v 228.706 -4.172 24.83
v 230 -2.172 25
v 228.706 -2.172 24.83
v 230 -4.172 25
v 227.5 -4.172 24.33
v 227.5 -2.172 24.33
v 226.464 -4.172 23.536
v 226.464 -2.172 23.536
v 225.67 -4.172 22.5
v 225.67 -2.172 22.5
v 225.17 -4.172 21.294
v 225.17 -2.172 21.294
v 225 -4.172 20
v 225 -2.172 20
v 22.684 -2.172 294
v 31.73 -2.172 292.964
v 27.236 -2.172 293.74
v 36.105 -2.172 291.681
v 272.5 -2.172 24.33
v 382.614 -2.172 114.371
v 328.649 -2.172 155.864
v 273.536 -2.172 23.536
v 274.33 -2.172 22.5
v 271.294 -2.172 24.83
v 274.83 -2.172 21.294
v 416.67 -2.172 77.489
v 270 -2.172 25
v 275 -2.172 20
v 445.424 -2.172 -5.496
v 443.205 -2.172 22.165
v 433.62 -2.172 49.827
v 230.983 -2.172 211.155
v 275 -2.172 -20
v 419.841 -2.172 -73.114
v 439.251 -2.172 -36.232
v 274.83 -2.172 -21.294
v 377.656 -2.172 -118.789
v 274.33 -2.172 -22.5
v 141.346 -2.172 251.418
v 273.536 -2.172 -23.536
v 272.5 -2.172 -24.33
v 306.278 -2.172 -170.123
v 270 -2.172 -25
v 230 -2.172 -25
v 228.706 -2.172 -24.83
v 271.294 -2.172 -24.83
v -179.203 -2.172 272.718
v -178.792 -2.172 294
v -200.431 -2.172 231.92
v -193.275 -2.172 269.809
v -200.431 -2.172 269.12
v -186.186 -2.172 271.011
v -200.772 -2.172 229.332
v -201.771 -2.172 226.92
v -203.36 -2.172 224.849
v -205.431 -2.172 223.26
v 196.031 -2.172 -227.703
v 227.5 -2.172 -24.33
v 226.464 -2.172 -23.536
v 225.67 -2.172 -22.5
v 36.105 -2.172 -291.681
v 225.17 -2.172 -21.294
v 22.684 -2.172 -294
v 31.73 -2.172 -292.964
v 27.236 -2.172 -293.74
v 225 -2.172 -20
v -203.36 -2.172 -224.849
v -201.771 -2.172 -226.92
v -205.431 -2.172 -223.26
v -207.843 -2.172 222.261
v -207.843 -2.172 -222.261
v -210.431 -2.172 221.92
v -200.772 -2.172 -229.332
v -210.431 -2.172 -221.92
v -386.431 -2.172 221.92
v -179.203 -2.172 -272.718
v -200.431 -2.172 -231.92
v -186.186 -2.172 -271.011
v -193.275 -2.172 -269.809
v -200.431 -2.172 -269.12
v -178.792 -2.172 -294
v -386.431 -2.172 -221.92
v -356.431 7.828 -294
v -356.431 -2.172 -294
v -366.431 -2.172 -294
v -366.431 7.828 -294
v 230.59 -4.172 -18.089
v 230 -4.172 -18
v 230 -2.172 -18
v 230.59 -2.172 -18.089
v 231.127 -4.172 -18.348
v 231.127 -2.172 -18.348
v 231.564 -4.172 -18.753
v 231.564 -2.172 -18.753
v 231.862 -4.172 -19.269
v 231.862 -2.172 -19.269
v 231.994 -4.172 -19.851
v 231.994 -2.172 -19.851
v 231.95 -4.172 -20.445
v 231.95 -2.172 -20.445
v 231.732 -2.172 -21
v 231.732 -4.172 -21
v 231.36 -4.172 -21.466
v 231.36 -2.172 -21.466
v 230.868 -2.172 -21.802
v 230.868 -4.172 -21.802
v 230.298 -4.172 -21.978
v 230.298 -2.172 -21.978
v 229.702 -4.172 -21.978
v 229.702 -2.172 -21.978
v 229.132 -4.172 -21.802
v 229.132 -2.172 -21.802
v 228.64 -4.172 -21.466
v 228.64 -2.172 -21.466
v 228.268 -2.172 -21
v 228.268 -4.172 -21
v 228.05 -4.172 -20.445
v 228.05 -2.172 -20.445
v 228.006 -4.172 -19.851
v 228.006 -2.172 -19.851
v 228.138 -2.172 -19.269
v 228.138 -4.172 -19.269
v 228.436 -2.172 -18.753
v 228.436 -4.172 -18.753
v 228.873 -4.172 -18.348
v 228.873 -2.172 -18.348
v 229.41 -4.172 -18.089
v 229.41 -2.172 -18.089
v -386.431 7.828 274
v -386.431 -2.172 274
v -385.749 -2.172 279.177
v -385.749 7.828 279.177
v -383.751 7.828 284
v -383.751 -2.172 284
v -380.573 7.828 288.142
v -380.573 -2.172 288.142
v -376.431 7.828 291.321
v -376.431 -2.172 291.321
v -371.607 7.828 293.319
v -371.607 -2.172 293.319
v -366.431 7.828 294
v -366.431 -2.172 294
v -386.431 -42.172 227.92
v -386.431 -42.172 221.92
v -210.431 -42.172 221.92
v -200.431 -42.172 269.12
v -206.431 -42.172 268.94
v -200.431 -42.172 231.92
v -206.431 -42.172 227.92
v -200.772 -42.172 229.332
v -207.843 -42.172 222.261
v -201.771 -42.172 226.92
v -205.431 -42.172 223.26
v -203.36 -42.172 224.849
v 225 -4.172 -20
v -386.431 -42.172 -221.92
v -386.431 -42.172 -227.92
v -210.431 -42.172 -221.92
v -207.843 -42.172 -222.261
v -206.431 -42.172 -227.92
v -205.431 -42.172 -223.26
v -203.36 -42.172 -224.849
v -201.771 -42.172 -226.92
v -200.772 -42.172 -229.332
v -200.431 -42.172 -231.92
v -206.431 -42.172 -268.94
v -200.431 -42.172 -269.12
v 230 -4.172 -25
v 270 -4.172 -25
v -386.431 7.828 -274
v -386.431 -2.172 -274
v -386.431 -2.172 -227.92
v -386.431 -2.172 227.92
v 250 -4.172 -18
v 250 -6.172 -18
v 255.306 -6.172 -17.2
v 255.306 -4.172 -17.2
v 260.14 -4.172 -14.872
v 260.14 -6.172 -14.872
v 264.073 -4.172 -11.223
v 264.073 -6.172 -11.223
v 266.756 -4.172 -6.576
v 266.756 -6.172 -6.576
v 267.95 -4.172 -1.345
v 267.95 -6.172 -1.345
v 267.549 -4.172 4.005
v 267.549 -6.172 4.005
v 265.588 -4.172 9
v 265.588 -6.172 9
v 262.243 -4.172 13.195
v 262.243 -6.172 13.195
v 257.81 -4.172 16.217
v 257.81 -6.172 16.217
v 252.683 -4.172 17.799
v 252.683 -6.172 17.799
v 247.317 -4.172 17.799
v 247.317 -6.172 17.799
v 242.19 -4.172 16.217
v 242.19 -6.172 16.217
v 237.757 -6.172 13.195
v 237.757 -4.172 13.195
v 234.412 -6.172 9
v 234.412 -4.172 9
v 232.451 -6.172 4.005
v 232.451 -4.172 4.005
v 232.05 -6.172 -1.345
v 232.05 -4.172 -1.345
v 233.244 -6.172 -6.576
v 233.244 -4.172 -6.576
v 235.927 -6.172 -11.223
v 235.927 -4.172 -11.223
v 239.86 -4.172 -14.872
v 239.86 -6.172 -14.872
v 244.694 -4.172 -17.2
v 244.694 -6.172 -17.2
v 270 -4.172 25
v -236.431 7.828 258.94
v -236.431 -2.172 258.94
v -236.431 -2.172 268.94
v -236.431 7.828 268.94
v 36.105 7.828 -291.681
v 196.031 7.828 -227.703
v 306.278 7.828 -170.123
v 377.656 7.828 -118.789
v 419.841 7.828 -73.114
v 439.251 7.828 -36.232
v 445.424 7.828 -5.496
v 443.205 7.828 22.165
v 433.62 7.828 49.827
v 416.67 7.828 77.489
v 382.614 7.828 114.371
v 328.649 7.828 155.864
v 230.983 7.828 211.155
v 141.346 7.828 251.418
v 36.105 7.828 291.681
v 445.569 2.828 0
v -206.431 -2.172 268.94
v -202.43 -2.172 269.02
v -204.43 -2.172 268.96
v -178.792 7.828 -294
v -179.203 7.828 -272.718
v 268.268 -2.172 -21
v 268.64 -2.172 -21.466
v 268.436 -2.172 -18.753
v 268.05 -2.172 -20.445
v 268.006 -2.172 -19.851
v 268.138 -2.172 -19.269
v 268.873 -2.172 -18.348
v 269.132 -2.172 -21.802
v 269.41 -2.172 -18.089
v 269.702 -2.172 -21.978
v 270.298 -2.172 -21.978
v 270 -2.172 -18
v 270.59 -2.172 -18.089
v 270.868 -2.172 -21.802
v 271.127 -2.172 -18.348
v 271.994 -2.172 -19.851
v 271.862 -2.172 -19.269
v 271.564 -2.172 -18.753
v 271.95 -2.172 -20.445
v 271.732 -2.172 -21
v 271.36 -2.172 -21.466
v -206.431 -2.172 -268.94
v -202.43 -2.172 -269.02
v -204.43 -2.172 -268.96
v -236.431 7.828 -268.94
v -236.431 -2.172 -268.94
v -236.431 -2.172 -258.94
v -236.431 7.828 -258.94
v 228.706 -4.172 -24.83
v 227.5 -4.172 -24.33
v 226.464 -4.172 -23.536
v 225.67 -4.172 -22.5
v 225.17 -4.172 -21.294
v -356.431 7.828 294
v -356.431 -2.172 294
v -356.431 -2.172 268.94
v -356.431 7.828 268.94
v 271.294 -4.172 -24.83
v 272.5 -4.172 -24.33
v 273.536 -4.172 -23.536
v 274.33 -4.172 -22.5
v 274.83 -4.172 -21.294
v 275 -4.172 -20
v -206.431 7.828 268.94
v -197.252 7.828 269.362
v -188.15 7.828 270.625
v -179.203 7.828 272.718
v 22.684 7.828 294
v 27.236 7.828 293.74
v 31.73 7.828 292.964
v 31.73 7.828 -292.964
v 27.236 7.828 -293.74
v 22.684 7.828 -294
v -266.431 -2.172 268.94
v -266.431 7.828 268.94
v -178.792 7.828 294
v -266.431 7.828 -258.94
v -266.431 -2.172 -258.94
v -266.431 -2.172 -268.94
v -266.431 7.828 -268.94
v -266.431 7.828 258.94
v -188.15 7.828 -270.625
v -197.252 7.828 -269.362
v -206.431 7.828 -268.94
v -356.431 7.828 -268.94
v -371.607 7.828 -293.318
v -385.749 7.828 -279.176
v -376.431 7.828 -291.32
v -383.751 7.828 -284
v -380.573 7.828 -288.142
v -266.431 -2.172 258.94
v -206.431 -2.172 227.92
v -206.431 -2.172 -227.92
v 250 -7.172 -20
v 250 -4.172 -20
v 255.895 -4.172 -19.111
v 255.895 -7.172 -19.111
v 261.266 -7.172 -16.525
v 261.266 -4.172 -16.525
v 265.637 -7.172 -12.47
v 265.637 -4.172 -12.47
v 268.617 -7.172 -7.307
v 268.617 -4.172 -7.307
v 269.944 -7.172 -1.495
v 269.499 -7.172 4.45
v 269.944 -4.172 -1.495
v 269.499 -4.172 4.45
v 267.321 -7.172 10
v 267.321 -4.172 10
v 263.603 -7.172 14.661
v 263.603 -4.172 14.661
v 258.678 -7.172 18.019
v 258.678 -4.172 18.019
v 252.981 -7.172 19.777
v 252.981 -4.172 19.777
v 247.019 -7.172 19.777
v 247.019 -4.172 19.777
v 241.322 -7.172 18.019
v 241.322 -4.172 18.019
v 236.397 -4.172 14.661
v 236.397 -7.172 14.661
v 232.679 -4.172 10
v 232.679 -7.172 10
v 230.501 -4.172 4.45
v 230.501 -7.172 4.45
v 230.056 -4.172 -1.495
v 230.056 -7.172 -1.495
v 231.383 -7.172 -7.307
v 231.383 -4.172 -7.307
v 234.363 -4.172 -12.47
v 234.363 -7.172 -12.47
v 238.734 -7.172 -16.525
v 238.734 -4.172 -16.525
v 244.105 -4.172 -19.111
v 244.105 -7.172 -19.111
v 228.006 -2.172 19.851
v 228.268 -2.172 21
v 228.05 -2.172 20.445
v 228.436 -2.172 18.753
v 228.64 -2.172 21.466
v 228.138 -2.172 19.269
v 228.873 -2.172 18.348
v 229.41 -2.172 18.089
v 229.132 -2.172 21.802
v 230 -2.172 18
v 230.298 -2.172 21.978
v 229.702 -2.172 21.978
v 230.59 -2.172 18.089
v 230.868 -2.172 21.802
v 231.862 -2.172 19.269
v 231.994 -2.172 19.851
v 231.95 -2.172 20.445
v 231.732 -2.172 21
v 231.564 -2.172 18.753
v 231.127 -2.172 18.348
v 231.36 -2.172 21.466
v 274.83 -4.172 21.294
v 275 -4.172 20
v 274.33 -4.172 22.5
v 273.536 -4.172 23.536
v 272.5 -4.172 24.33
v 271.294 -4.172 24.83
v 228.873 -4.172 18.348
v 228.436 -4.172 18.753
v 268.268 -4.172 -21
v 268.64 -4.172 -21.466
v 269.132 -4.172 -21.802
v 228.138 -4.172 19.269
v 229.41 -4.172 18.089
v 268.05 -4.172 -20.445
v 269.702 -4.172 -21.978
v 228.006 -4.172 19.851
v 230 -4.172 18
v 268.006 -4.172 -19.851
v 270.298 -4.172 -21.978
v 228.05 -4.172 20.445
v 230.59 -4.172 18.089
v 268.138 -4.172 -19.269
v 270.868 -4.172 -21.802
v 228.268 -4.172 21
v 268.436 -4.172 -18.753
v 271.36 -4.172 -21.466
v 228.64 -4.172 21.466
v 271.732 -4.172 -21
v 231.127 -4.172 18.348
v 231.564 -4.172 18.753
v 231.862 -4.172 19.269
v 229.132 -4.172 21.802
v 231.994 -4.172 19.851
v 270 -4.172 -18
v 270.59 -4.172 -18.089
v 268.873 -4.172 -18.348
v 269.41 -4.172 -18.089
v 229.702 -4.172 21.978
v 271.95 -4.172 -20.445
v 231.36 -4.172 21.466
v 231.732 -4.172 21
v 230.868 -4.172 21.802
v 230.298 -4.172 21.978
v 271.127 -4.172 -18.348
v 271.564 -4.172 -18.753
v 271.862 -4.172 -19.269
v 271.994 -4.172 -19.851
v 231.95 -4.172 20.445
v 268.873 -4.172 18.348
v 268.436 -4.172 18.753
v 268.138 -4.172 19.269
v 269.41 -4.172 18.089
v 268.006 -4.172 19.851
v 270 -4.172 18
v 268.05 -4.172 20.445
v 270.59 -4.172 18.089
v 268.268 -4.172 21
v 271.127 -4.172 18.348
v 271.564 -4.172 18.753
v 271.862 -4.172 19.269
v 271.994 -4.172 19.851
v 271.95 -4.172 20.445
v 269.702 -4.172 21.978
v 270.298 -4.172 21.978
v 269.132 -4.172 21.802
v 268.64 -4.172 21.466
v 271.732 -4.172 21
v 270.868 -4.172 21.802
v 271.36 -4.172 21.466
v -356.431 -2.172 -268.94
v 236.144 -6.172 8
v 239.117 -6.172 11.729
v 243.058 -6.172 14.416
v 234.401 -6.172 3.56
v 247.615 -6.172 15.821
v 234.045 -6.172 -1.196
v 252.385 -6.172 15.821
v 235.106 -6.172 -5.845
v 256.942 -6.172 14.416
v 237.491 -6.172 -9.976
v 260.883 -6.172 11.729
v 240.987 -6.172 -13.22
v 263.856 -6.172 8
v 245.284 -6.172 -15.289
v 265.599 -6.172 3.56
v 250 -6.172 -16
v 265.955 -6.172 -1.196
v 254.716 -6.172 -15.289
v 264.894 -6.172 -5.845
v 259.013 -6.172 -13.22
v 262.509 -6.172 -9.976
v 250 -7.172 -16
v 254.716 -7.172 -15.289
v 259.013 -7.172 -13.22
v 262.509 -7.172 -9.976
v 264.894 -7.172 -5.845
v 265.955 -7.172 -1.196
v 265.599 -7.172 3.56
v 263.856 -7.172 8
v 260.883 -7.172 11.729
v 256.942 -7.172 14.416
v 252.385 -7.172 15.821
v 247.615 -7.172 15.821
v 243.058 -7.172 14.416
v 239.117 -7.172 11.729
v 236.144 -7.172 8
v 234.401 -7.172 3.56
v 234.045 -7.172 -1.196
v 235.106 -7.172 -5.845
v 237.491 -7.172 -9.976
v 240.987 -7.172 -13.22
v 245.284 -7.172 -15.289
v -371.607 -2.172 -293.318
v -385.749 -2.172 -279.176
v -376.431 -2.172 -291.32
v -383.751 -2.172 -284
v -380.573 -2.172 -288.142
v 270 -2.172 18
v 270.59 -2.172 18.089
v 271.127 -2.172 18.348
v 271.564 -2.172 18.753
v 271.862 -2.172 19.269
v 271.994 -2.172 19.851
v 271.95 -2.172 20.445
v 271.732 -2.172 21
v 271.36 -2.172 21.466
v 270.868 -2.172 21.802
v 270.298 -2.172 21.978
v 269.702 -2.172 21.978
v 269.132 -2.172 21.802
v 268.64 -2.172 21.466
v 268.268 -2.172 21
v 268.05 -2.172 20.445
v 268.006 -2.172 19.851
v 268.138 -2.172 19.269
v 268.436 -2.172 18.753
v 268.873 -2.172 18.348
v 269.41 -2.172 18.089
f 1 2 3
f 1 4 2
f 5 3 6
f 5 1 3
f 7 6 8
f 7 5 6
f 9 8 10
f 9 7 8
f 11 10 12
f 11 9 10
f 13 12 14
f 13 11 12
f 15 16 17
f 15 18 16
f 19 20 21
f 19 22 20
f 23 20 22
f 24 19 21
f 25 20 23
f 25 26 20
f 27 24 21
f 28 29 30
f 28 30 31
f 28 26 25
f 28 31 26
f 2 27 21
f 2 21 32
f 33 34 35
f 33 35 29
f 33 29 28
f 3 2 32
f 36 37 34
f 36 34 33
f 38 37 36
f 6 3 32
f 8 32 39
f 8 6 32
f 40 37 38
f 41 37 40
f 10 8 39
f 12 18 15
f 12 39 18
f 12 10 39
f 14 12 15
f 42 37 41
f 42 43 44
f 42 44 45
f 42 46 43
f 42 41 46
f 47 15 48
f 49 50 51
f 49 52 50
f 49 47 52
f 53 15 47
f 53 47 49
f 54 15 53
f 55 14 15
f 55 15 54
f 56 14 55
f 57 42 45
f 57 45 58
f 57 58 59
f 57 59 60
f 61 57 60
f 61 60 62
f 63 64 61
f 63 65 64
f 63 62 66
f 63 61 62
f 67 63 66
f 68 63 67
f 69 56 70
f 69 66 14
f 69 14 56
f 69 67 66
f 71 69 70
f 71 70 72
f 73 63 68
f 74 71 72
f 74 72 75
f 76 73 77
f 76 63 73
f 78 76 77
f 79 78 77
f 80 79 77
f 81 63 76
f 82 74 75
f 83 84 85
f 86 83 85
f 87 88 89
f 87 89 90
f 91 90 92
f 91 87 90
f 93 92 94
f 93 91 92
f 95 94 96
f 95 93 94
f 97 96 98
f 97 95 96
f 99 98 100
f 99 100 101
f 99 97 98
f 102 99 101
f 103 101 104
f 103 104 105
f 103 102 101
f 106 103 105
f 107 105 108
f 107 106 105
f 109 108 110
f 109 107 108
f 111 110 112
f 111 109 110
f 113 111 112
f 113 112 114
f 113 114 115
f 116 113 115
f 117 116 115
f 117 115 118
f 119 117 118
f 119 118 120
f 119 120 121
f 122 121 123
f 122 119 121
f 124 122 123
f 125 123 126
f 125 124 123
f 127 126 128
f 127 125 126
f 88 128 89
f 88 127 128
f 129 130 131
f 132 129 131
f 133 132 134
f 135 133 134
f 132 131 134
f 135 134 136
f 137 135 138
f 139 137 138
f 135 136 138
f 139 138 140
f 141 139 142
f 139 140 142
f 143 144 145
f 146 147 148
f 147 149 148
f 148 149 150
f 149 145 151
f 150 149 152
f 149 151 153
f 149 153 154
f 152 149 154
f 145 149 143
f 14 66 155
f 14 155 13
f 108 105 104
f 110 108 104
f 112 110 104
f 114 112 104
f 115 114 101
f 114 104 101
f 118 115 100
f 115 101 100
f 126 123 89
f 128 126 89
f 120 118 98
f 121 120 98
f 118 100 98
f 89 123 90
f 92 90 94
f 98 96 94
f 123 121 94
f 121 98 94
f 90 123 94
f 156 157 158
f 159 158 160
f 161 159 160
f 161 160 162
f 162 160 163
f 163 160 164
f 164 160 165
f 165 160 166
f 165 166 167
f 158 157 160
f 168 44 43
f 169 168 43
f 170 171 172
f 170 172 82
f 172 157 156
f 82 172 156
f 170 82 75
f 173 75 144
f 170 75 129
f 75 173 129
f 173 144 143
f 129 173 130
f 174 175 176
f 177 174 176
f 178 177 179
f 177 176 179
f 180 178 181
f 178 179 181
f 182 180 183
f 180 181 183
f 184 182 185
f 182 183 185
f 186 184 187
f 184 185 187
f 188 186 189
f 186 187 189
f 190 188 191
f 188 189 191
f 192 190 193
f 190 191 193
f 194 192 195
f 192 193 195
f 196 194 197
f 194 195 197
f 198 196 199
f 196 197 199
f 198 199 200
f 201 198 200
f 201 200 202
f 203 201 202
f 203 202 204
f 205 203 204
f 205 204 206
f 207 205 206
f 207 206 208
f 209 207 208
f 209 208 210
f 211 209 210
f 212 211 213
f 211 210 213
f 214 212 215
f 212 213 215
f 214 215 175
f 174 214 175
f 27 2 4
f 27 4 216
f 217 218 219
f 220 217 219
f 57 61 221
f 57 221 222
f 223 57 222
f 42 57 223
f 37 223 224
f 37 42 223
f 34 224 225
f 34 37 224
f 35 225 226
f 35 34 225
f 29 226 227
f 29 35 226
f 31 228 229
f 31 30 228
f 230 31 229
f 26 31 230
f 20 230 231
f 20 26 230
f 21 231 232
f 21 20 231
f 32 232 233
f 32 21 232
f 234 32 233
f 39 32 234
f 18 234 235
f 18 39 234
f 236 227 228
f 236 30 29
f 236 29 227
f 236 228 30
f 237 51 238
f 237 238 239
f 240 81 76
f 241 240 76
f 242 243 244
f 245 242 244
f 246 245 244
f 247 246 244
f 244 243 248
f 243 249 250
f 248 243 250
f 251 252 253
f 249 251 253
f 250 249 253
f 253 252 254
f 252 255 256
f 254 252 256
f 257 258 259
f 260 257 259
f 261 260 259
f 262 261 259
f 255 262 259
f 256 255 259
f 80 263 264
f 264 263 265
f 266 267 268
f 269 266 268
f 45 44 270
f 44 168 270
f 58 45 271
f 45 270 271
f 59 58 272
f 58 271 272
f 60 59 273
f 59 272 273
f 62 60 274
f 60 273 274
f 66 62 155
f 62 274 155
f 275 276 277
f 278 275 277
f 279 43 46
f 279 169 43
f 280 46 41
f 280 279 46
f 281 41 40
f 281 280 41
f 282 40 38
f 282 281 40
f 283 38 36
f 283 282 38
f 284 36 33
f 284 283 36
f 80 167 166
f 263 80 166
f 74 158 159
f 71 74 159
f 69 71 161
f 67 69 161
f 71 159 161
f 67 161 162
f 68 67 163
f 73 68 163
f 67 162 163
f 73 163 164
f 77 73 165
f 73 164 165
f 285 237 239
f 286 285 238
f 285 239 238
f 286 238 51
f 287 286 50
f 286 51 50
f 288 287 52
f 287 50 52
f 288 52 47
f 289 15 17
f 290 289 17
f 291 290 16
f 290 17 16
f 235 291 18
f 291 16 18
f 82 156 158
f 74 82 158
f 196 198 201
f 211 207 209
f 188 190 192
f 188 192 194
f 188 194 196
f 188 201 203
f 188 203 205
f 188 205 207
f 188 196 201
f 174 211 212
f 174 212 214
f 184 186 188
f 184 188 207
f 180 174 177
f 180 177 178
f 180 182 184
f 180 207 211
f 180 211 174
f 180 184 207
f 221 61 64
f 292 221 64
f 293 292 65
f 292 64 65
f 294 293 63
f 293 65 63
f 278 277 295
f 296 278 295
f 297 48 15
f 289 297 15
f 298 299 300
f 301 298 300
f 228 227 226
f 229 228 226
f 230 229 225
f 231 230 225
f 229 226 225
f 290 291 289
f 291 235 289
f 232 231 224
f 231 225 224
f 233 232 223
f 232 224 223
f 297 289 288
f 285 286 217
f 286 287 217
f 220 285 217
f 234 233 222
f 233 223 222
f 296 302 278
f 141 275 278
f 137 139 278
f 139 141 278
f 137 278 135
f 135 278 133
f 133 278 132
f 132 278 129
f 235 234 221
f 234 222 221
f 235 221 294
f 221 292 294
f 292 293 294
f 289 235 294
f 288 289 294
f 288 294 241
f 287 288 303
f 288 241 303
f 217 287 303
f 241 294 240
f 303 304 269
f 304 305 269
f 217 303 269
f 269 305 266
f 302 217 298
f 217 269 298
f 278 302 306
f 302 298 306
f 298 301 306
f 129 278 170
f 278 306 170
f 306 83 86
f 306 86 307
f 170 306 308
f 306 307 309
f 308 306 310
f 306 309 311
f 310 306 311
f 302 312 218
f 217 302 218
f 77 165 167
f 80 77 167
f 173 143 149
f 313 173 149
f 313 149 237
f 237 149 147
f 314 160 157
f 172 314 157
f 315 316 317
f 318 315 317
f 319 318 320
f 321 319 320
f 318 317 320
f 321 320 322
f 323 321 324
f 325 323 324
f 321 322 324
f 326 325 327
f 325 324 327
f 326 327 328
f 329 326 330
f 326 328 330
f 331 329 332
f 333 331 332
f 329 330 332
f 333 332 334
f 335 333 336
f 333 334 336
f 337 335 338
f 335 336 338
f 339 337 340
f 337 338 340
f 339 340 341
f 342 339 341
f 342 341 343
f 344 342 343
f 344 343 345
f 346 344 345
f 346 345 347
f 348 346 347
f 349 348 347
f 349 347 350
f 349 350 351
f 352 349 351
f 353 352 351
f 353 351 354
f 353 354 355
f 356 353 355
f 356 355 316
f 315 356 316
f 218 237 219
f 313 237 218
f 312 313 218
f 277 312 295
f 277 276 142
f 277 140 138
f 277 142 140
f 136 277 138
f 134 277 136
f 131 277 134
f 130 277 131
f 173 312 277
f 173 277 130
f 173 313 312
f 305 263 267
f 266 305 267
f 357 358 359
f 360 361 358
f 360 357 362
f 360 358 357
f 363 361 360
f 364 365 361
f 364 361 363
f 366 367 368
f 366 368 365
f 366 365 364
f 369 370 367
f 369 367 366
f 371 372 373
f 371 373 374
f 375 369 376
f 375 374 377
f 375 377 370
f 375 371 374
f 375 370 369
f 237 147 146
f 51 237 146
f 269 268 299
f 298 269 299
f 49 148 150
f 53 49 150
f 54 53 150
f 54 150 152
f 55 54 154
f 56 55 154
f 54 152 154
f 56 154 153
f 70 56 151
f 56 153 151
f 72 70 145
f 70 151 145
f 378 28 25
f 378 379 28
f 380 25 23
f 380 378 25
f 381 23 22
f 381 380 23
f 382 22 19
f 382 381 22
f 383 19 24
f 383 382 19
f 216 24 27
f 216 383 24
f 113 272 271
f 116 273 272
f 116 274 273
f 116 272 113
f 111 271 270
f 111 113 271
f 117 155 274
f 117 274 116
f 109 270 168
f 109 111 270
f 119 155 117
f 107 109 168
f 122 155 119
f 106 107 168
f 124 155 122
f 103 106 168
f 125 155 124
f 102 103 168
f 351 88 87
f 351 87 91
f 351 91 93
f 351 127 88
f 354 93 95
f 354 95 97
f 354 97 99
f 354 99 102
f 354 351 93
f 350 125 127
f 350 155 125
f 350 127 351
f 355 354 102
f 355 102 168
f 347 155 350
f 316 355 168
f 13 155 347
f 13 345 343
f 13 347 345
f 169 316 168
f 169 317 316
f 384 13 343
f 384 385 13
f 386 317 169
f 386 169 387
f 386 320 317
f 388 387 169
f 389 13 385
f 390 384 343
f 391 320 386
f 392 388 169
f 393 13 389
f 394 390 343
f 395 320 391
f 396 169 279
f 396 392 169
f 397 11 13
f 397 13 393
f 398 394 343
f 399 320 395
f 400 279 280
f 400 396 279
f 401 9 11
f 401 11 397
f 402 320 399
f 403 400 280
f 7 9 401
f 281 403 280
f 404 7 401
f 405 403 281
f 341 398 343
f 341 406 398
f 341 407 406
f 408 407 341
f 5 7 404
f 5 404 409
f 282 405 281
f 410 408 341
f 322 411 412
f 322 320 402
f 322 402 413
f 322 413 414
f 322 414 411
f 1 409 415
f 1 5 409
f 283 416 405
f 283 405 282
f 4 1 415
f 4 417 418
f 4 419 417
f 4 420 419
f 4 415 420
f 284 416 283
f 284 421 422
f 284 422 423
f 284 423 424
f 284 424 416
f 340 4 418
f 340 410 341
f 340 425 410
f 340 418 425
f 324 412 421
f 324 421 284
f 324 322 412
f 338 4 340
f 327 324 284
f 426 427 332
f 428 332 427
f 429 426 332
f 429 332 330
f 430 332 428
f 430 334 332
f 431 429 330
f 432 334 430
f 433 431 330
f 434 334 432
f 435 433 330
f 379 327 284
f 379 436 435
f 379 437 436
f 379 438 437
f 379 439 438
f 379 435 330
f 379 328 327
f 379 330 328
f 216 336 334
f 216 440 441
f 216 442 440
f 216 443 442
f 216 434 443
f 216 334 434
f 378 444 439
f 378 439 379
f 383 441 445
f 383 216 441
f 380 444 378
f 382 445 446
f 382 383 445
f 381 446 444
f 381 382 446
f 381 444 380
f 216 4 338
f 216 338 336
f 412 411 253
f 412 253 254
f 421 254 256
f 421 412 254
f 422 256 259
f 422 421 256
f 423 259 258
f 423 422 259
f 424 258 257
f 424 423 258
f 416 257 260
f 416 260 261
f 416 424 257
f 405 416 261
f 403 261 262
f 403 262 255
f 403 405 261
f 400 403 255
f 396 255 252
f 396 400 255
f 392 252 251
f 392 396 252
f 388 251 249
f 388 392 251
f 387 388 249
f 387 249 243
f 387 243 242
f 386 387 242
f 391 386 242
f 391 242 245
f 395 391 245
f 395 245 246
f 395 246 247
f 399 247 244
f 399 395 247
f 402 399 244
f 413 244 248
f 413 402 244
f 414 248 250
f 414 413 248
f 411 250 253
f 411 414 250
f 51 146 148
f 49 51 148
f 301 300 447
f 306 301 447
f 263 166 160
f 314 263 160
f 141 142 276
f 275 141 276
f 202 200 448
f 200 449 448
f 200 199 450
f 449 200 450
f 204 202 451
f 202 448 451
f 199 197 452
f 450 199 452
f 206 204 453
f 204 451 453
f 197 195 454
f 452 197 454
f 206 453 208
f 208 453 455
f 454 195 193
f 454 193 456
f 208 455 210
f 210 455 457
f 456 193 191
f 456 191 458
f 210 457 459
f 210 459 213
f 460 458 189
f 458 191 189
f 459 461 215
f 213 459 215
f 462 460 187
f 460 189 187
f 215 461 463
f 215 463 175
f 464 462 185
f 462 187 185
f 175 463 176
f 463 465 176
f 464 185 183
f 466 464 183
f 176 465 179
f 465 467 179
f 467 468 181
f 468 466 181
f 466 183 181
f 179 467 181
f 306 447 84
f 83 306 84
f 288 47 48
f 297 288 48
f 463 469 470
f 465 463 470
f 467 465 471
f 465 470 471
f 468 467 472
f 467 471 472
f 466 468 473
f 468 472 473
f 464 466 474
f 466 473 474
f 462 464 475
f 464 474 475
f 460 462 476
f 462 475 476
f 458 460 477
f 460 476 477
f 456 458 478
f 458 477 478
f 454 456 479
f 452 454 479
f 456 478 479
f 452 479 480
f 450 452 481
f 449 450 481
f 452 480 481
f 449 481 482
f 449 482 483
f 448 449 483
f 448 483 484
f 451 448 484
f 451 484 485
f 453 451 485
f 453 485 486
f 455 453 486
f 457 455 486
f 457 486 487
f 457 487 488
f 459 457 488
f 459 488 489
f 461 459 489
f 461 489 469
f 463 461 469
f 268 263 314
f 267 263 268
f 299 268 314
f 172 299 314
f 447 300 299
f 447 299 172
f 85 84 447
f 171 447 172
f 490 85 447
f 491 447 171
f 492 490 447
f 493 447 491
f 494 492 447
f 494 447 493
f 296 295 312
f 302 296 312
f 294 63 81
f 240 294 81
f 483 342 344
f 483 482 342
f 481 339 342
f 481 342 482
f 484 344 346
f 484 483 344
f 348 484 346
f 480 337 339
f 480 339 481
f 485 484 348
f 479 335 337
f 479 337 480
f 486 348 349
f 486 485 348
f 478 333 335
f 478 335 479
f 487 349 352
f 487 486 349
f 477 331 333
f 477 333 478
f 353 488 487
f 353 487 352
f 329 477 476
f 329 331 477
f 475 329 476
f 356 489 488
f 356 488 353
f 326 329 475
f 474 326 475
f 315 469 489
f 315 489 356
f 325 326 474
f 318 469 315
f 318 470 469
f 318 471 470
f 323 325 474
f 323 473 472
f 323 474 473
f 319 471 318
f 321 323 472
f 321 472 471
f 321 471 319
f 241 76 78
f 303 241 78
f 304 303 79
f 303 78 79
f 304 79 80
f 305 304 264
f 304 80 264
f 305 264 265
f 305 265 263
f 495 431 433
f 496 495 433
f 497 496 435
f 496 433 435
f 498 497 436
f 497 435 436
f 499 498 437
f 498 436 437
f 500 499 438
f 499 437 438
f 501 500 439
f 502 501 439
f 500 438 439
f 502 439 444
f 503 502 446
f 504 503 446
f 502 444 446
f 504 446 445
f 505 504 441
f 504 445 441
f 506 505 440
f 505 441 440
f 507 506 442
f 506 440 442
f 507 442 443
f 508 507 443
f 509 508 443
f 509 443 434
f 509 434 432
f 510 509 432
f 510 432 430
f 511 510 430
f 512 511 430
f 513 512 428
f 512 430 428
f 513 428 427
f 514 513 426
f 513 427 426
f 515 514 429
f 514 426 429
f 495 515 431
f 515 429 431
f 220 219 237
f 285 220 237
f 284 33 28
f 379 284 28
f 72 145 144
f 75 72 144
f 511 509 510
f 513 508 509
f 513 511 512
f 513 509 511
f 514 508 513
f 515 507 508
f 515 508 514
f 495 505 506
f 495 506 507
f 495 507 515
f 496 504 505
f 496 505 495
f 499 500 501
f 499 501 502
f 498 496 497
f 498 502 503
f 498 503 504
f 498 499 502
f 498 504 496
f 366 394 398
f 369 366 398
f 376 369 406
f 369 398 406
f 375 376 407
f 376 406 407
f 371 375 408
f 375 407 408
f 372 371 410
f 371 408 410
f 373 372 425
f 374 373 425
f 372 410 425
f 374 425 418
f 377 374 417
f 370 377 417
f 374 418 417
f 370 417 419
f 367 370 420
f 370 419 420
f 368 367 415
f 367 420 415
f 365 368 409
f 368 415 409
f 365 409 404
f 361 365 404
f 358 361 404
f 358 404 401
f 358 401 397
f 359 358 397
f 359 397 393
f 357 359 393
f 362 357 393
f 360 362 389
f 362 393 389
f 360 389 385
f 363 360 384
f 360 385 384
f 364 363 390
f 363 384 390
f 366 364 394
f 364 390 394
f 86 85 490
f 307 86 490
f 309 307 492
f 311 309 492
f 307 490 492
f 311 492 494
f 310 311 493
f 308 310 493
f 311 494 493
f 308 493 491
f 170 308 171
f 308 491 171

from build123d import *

# Parameters (mm, degrees)
CROQUIS1_W                 = 416
CROQUIS1_H                 = 294
SALIENTE_EXTRUIR1_DEPTH    = 5
CORTAR_EXTRUIR1_DEPTH      = 255.750858684
REDONDEO1_R                = 10
SALIENTE_EXTRUIR3_DEPTH    = 20
REDONDEO2_R                = 5
REDONDEO2_OF_SIMETR_A3_R   = 5
CORTAR_EXTRUIR5_DEPTH      = 256.925770488
CORTAR_EXTRUIR5_DEPTH_BACK = 256.925770488
REDONDEO4_R                = 20
ESCALA1_START              = -20
ESCALA1_DEPTH              = 17.828103166
ESCALA1_START_2            = -2.171896834
ESCALA1_2_DEPTH            = 10
ESCALA1_START_3            = -42.171896834
ESCALA1_3_DEPTH            = 40
CROQUIS9_W                 = 50
CROQUIS9_H                 = 50
SALIENTE_EXTRUIR4_DEPTH    = 2
REDONDEO5_R                = 5
CROQUIS10_R                = 2
CORTAR_EXTRUIR7_DEPTH      = 2
CROQUIS11_R                = 20
SALIENTE_EXTRUIR5_DEPTH    = 3
CROQUIS12_R                = 16
CORTAR_EXTRUIR8_DEPTH      = 3
CROQUIS13_R                = 20
SALIENTE_EXTRUIR6_DEPTH    = 2
CROQUIS14_R                = 18
CORTAR_EXTRUIR9_DEPTH      = 2


# Read off the part's stored shape, not the designer's step: Escala1
with BuildPart() as part:
    # Croquis1 → Saliente-Extruir1 (new body)
    with BuildSketch(Plane(origin=(0, 0, 0), x_dir=(1, 0, 0), z_dir=(0, 1, 0))):
        Rectangle(CROQUIS1_W, CROQUIS1_H)
    extrude(amount=SALIENTE_EXTRUIR1_DEPTH)

    # Croquis3 → Cortar-Extruir1 (cut, through all)
    with BuildSketch(Plane(origin=(0, 5, 0), x_dir=(1, 0, 0), z_dir=(0, 1, 0))):
        with BuildLine():
            Line((-193, 154.47), (-193, 134.47))
            Line((-193, 134.47), (-148, 134.47))
            Line((-148, 134.47), (-148, 129.47))
            Line((-148, 129.47), (-133, 129.47))
            Line((-133, 129.47), (-133, 134.47))
            Line((-133, 134.47), (-118, 134.47))
            ThreePointArc((-118, 134.47), (-111.127739024, 134.944531511), (-104.385922224, 136.359118837))
            Line((-104.385922224, 136.359118837), (-104, 156.355395091))
            Line((-104, 156.355395091), (-193, 156.355395091))
            Line((-193, 156.355395091), (-193, 154.47))
        make_face()
    cortar_extruir1 = extrude(amount=-CORTAR_EXTRUIR1_DEPTH, mode=Mode.SUBTRACT)

    # Simetría1: Cortar-Extruir1 across plane
    add(cortar_extruir1.mirror(Plane.XY), mode=Mode.SUBTRACT)

    # Redondeo1
    redondeo1_edges = [part.edges().sort_by_distance(p)[0] for p in [
        (-208, 2.5, -147),
        (208, 2.5, -147),
        (208, 2.5, 147),
        (-208, 2.5, 147),
    ]]
    fillet(redondeo1_edges, radius=REDONDEO1_R)

    # Croquis5 → Saliente-Extruir3 (add)
    with BuildSketch(Plane.XZ):
        Polygon((-208, 110.96), (-115, 110.96), (-115, 134.560081146), (-118, 134.47), (-118, 113.96), (-208, 113.96), align=None)
    saliente_extruir3 = extrude(amount=SALIENTE_EXTRUIR3_DEPTH)

    # Redondeo2
    redondeo2_edges = [part.edges().sort_by_distance(p)[0] for p in [
        (-115, -10, 110.96),
    ]]
    fillet(redondeo2_edges, radius=REDONDEO2_R)

    # Simetría3: Saliente-Extruir3 across plane
    add(saliente_extruir3.mirror(Plane.XY))

    # Redondeo2 of Simetría3
    redondeo2_of_simetr_a3_edges = [part.edges().sort_by_distance(p)[0] for p in [
        (-115, -10, -110.96),
    ]]
    fillet(redondeo2_of_simetr_a3_edges, radius=REDONDEO2_OF_SIMETR_A3_R)

    # Croquis7 → Cortar-Extruir5 (cut, two sides: drawn at the far end of the back side and taken through both)
    with BuildSketch(Plane(origin=(0, 5, 0), x_dir=(1, 0, 0), z_dir=(0, 1, 0)).offset(-CORTAR_EXTRUIR5_DEPTH_BACK)):
        with BuildLine():
            Line((198, 147), (0, 147))
            add(Edge.make_bspline(
                [(0, 147), (208, 73.5), (208, 0)],
                knots=[0, 0, 0, 0.5, 0.5, 0.5], degree=2))
            Line((208, 0), (208, 137))
            ThreePointArc((208, 137), (205.071067812, 144.071067812), (198, 147))
        make_face()
        with BuildLine():
            Line((208, -137), (208, 0))
            add(Edge.make_bspline(
                [(208, 0), (208, -73.5), (0, -147)],
                knots=[0.5, 0.5, 0.5, 1, 1, 1], degree=2))
            Line((0, -147), (198, -147))
            ThreePointArc((198, -147), (205.071067812, -144.071067812), (208, -137))
        make_face()
    extrude(amount=CORTAR_EXTRUIR5_DEPTH + CORTAR_EXTRUIR5_DEPTH_BACK, mode=Mode.SUBTRACT)

    # Redondeo4
    redondeo4_edges = [part.edges().sort_by_distance(p)[0] for p in [
        (0, 2.5, -147),
        (0, 2.5, 147),
    ]]
    fillet(redondeo4_edges, radius=REDONDEO4_R)

    # Escala1 outline → Escala1 (cut)
    with BuildSketch(Plane(origin=(0, 0, 0), x_dir=(1, 0, 0), z_dir=(0, 1, 0)).offset(ESCALA1_START)):
        with BuildLine():
            Line((-115, 115.96), (-115, 134.560081146))
            Line((-115, 134.560081146), (-118, 134.47))
            Line((-118, 134.47), (-118, 113.96))
            Line((-118, 113.96), (-208, 113.96))
            Line((-208, 113.96), (-208, 110.96))
            Line((-208, 110.96), (-120, 110.96))
            ThreePointArc((-120, 110.96), (-116.464466094, 112.424466094), (-115, 115.96))
        make_face()
        with BuildLine():
            Line((-118, -134.47), (-115, -134.560081146))
            Line((-115, -134.560081146), (-115, -115.96))
            ThreePointArc((-115, -115.96), (-116.464466094, -112.424466094), (-120, -110.96))
            Line((-120, -110.96), (-208, -110.96))
            Line((-208, -110.96), (-208, -113.96))
            Line((-208, -113.96), (-118, -113.96))
            Line((-118, -113.96), (-118, -134.47))
        make_face()
    extrude(amount=ESCALA1_DEPTH, mode=Mode.SUBTRACT)

    # Escala1 2 outline → Escala1 2 (add)
    with BuildSketch(Plane(origin=(0, 0, 0), x_dir=(1, 0, 0), z_dir=(0, 1, 0)).offset(ESCALA1_START_2)):
        with BuildLine():
            add(Edge.make_bspline(
                [(36.105170669, 291.681097591), (855.032944113, -0.000122107), (36.105170669, -291.681341805)],
                knots=[0.003943504, 0.003943504, 0.003943504, 0.996056496, 0.996056496, 0.996056496], degree=2))
            ThreePointArc((36.105170669, 291.681097591), (29.49404346, 293.415920236), (22.684079728, 293.999877893))
            Line((22.684079728, 293.999877893), (-178.792055331, 293.999877893))
            Line((-178.792055331, 293.999877893), (-179.202787056, 272.718115567))
            ThreePointArc((-179.202787056, 272.718115567), (-192.686420657, 269.888940914), (-206.430942609, 268.939877893))
            Line((-206.430942609, 268.939877893), (-236.430942609, 268.939877893))
            Line((-236.430942609, 268.939877893), (-236.430942609, 258.939877893))
            Line((-236.430942609, 258.939877893), (-266.430942609, 258.939877893))
            Line((-266.430942609, 258.939877893), (-266.430942609, 268.939877893))
            Line((-266.430942609, 268.939877893), (-356.430942609, 268.939877893))
            Line((-356.430942609, 268.939877893), (-356.430942609, 293.999877893))
            Line((-356.430942609, 293.999877893), (-366.430942609, 293.999877893))
            ThreePointArc((-366.430942609, 293.999877893), (-380.573078233, 288.142013517), (-386.430942609, 273.999877893))
            Line((-386.430942609, 273.999877893), (-386.430942609, -274.000122107))
            ThreePointArc((-386.430942609, -274.000122107), (-380.573078233, -288.142257731), (-366.430942609, -294.000122107))
            Line((-366.430942609, -294.000122107), (-356.430942609, -294.000122107))
            Line((-356.430942609, -294.000122107), (-356.430942609, -268.940122107))
            Line((-356.430942609, -268.940122107), (-266.430942609, -268.940122107))
            Line((-266.430942609, -268.940122107), (-266.430942609, -258.940122107))
            Line((-266.430942609, -258.940122107), (-236.430942609, -258.940122107))
            Line((-236.430942609, -258.940122107), (-236.430942609, -268.940122107))
            Line((-236.430942609, -268.940122107), (-206.430942609, -268.940122107))
            ThreePointArc((-206.430942609, -268.940122107), (-192.686420657, -269.889185129), (-179.202787056, -272.718359781))
            Line((-179.202787056, -272.718359781), (-178.792055331, -294.000122107))
            Line((-178.792055331, -294.000122107), (22.684079728, -294.000122107))
            ThreePointArc((22.684079728, -294.000122107), (29.49404346, -293.41616445), (36.105170669, -291.681341805))
        make_face()
    extrude(amount=ESCALA1_2_DEPTH)

    # Escala1 3 outline → Escala1 3 (add)
    with BuildSketch(Plane(origin=(0, 0, 0), x_dir=(1, 0, 0), z_dir=(0, 1, 0)).offset(ESCALA1_START_3)):
        with BuildLine():
            Line((-200.430942609, 231.919877893), (-200.430942609, 269.120040185))
            Line((-200.430942609, 269.120040185), (-206.430942609, 268.939877893))
            Line((-206.430942609, 268.939877893), (-206.430942609, 227.919877893))
            Line((-206.430942609, 227.919877893), (-386.430942609, 227.919877893))
            Line((-386.430942609, 227.919877893), (-386.430942609, 221.919877893))
            Line((-386.430942609, 221.919877893), (-210.430942609, 221.919877893))
            ThreePointArc((-210.430942609, 221.919877893), (-203.359874797, 224.848810081), (-200.430942609, 231.919877893))
        make_face()
        with BuildLine():
            Line((-206.430942609, -268.940122107), (-200.430942609, -269.120284399))
            Line((-200.430942609, -269.120284399), (-200.430942609, -231.920122107))
            ThreePointArc((-200.430942609, -231.920122107), (-203.359874797, -224.849054295), (-210.430942609, -221.920122107))
            Line((-210.430942609, -221.920122107), (-386.430942609, -221.920122107))
            Line((-386.430942609, -221.920122107), (-386.430942609, -227.920122107))
            Line((-386.430942609, -227.920122107), (-206.430942609, -227.920122107))
            Line((-206.430942609, -227.920122107), (-206.430942609, -268.940122107))
        make_face()
    extrude(amount=ESCALA1_3_DEPTH)

    # Croquis9 → Saliente-Extruir4 (add)
    with BuildSketch(Plane.XZ.offset(2.171896834)):
        with Locations((250, 0)):
            Rectangle(CROQUIS9_W, CROQUIS9_H)
    extrude(amount=SALIENTE_EXTRUIR4_DEPTH)

    # Redondeo5
    redondeo5_edges = [part.edges().sort_by_distance(p)[0] for p in [
        (275, -3.171896834, -25),
        (275, -3.171896834, 25),
        (225, -3.171896834, 25),
        (225, -3.171896834, -25),
    ]]
    fillet(redondeo5_edges, radius=REDONDEO5_R)

    # Croquis10 → Cortar-Extruir7 (cut)
    with BuildSketch(Plane.XZ.offset(4.171896834)):
        with Locations(Location((230, 20, 0), (0, 0, 270))):
            Circle(CROQUIS10_R)
        with Locations(Location((270, 20, 0), (0, 0, 270))):
            Circle(CROQUIS10_R)
    cortar_extruir7 = extrude(amount=-CORTAR_EXTRUIR7_DEPTH, mode=Mode.SUBTRACT)

    # Simetría7: Cortar-Extruir7 across plane
    add(cortar_extruir7.mirror(Plane.XY), mode=Mode.SUBTRACT)

    # Croquis11 → Saliente-Extruir5 (add)
    with BuildSketch(Plane.XZ.offset(4.171896834)):
        with Locations(Location((250, 0, 0), (0, 0, 270))):
            Circle(CROQUIS11_R)
    extrude(amount=SALIENTE_EXTRUIR5_DEPTH)

    # Croquis12 → Cortar-Extruir8 (cut)
    with BuildSketch(Plane.XZ.offset(7.171896834)):
        with Locations(Location((250, 0, 0), (0, 0, 270))):
            Circle(CROQUIS12_R)
    extrude(amount=-CORTAR_EXTRUIR8_DEPTH, mode=Mode.SUBTRACT)

    # Croquis13 → Saliente-Extruir6 (add)
    with BuildSketch(Plane.XZ.offset(4.171896834)):
        with Locations(Location((250, 0, 0), (0, 0, 270))):
            Circle(CROQUIS13_R)
    extrude(amount=SALIENTE_EXTRUIR6_DEPTH)

    # Croquis14 → Cortar-Extruir9 (cut)
    with BuildSketch(Plane.XZ.offset(6.171896834)):
        with Locations(Location((250, 0, 0), (0, 0, 270))):
            Circle(CROQUIS14_R)
    extrude(amount=-CORTAR_EXTRUIR9_DEPTH, mode=Mode.SUBTRACT)


solid = part.part
